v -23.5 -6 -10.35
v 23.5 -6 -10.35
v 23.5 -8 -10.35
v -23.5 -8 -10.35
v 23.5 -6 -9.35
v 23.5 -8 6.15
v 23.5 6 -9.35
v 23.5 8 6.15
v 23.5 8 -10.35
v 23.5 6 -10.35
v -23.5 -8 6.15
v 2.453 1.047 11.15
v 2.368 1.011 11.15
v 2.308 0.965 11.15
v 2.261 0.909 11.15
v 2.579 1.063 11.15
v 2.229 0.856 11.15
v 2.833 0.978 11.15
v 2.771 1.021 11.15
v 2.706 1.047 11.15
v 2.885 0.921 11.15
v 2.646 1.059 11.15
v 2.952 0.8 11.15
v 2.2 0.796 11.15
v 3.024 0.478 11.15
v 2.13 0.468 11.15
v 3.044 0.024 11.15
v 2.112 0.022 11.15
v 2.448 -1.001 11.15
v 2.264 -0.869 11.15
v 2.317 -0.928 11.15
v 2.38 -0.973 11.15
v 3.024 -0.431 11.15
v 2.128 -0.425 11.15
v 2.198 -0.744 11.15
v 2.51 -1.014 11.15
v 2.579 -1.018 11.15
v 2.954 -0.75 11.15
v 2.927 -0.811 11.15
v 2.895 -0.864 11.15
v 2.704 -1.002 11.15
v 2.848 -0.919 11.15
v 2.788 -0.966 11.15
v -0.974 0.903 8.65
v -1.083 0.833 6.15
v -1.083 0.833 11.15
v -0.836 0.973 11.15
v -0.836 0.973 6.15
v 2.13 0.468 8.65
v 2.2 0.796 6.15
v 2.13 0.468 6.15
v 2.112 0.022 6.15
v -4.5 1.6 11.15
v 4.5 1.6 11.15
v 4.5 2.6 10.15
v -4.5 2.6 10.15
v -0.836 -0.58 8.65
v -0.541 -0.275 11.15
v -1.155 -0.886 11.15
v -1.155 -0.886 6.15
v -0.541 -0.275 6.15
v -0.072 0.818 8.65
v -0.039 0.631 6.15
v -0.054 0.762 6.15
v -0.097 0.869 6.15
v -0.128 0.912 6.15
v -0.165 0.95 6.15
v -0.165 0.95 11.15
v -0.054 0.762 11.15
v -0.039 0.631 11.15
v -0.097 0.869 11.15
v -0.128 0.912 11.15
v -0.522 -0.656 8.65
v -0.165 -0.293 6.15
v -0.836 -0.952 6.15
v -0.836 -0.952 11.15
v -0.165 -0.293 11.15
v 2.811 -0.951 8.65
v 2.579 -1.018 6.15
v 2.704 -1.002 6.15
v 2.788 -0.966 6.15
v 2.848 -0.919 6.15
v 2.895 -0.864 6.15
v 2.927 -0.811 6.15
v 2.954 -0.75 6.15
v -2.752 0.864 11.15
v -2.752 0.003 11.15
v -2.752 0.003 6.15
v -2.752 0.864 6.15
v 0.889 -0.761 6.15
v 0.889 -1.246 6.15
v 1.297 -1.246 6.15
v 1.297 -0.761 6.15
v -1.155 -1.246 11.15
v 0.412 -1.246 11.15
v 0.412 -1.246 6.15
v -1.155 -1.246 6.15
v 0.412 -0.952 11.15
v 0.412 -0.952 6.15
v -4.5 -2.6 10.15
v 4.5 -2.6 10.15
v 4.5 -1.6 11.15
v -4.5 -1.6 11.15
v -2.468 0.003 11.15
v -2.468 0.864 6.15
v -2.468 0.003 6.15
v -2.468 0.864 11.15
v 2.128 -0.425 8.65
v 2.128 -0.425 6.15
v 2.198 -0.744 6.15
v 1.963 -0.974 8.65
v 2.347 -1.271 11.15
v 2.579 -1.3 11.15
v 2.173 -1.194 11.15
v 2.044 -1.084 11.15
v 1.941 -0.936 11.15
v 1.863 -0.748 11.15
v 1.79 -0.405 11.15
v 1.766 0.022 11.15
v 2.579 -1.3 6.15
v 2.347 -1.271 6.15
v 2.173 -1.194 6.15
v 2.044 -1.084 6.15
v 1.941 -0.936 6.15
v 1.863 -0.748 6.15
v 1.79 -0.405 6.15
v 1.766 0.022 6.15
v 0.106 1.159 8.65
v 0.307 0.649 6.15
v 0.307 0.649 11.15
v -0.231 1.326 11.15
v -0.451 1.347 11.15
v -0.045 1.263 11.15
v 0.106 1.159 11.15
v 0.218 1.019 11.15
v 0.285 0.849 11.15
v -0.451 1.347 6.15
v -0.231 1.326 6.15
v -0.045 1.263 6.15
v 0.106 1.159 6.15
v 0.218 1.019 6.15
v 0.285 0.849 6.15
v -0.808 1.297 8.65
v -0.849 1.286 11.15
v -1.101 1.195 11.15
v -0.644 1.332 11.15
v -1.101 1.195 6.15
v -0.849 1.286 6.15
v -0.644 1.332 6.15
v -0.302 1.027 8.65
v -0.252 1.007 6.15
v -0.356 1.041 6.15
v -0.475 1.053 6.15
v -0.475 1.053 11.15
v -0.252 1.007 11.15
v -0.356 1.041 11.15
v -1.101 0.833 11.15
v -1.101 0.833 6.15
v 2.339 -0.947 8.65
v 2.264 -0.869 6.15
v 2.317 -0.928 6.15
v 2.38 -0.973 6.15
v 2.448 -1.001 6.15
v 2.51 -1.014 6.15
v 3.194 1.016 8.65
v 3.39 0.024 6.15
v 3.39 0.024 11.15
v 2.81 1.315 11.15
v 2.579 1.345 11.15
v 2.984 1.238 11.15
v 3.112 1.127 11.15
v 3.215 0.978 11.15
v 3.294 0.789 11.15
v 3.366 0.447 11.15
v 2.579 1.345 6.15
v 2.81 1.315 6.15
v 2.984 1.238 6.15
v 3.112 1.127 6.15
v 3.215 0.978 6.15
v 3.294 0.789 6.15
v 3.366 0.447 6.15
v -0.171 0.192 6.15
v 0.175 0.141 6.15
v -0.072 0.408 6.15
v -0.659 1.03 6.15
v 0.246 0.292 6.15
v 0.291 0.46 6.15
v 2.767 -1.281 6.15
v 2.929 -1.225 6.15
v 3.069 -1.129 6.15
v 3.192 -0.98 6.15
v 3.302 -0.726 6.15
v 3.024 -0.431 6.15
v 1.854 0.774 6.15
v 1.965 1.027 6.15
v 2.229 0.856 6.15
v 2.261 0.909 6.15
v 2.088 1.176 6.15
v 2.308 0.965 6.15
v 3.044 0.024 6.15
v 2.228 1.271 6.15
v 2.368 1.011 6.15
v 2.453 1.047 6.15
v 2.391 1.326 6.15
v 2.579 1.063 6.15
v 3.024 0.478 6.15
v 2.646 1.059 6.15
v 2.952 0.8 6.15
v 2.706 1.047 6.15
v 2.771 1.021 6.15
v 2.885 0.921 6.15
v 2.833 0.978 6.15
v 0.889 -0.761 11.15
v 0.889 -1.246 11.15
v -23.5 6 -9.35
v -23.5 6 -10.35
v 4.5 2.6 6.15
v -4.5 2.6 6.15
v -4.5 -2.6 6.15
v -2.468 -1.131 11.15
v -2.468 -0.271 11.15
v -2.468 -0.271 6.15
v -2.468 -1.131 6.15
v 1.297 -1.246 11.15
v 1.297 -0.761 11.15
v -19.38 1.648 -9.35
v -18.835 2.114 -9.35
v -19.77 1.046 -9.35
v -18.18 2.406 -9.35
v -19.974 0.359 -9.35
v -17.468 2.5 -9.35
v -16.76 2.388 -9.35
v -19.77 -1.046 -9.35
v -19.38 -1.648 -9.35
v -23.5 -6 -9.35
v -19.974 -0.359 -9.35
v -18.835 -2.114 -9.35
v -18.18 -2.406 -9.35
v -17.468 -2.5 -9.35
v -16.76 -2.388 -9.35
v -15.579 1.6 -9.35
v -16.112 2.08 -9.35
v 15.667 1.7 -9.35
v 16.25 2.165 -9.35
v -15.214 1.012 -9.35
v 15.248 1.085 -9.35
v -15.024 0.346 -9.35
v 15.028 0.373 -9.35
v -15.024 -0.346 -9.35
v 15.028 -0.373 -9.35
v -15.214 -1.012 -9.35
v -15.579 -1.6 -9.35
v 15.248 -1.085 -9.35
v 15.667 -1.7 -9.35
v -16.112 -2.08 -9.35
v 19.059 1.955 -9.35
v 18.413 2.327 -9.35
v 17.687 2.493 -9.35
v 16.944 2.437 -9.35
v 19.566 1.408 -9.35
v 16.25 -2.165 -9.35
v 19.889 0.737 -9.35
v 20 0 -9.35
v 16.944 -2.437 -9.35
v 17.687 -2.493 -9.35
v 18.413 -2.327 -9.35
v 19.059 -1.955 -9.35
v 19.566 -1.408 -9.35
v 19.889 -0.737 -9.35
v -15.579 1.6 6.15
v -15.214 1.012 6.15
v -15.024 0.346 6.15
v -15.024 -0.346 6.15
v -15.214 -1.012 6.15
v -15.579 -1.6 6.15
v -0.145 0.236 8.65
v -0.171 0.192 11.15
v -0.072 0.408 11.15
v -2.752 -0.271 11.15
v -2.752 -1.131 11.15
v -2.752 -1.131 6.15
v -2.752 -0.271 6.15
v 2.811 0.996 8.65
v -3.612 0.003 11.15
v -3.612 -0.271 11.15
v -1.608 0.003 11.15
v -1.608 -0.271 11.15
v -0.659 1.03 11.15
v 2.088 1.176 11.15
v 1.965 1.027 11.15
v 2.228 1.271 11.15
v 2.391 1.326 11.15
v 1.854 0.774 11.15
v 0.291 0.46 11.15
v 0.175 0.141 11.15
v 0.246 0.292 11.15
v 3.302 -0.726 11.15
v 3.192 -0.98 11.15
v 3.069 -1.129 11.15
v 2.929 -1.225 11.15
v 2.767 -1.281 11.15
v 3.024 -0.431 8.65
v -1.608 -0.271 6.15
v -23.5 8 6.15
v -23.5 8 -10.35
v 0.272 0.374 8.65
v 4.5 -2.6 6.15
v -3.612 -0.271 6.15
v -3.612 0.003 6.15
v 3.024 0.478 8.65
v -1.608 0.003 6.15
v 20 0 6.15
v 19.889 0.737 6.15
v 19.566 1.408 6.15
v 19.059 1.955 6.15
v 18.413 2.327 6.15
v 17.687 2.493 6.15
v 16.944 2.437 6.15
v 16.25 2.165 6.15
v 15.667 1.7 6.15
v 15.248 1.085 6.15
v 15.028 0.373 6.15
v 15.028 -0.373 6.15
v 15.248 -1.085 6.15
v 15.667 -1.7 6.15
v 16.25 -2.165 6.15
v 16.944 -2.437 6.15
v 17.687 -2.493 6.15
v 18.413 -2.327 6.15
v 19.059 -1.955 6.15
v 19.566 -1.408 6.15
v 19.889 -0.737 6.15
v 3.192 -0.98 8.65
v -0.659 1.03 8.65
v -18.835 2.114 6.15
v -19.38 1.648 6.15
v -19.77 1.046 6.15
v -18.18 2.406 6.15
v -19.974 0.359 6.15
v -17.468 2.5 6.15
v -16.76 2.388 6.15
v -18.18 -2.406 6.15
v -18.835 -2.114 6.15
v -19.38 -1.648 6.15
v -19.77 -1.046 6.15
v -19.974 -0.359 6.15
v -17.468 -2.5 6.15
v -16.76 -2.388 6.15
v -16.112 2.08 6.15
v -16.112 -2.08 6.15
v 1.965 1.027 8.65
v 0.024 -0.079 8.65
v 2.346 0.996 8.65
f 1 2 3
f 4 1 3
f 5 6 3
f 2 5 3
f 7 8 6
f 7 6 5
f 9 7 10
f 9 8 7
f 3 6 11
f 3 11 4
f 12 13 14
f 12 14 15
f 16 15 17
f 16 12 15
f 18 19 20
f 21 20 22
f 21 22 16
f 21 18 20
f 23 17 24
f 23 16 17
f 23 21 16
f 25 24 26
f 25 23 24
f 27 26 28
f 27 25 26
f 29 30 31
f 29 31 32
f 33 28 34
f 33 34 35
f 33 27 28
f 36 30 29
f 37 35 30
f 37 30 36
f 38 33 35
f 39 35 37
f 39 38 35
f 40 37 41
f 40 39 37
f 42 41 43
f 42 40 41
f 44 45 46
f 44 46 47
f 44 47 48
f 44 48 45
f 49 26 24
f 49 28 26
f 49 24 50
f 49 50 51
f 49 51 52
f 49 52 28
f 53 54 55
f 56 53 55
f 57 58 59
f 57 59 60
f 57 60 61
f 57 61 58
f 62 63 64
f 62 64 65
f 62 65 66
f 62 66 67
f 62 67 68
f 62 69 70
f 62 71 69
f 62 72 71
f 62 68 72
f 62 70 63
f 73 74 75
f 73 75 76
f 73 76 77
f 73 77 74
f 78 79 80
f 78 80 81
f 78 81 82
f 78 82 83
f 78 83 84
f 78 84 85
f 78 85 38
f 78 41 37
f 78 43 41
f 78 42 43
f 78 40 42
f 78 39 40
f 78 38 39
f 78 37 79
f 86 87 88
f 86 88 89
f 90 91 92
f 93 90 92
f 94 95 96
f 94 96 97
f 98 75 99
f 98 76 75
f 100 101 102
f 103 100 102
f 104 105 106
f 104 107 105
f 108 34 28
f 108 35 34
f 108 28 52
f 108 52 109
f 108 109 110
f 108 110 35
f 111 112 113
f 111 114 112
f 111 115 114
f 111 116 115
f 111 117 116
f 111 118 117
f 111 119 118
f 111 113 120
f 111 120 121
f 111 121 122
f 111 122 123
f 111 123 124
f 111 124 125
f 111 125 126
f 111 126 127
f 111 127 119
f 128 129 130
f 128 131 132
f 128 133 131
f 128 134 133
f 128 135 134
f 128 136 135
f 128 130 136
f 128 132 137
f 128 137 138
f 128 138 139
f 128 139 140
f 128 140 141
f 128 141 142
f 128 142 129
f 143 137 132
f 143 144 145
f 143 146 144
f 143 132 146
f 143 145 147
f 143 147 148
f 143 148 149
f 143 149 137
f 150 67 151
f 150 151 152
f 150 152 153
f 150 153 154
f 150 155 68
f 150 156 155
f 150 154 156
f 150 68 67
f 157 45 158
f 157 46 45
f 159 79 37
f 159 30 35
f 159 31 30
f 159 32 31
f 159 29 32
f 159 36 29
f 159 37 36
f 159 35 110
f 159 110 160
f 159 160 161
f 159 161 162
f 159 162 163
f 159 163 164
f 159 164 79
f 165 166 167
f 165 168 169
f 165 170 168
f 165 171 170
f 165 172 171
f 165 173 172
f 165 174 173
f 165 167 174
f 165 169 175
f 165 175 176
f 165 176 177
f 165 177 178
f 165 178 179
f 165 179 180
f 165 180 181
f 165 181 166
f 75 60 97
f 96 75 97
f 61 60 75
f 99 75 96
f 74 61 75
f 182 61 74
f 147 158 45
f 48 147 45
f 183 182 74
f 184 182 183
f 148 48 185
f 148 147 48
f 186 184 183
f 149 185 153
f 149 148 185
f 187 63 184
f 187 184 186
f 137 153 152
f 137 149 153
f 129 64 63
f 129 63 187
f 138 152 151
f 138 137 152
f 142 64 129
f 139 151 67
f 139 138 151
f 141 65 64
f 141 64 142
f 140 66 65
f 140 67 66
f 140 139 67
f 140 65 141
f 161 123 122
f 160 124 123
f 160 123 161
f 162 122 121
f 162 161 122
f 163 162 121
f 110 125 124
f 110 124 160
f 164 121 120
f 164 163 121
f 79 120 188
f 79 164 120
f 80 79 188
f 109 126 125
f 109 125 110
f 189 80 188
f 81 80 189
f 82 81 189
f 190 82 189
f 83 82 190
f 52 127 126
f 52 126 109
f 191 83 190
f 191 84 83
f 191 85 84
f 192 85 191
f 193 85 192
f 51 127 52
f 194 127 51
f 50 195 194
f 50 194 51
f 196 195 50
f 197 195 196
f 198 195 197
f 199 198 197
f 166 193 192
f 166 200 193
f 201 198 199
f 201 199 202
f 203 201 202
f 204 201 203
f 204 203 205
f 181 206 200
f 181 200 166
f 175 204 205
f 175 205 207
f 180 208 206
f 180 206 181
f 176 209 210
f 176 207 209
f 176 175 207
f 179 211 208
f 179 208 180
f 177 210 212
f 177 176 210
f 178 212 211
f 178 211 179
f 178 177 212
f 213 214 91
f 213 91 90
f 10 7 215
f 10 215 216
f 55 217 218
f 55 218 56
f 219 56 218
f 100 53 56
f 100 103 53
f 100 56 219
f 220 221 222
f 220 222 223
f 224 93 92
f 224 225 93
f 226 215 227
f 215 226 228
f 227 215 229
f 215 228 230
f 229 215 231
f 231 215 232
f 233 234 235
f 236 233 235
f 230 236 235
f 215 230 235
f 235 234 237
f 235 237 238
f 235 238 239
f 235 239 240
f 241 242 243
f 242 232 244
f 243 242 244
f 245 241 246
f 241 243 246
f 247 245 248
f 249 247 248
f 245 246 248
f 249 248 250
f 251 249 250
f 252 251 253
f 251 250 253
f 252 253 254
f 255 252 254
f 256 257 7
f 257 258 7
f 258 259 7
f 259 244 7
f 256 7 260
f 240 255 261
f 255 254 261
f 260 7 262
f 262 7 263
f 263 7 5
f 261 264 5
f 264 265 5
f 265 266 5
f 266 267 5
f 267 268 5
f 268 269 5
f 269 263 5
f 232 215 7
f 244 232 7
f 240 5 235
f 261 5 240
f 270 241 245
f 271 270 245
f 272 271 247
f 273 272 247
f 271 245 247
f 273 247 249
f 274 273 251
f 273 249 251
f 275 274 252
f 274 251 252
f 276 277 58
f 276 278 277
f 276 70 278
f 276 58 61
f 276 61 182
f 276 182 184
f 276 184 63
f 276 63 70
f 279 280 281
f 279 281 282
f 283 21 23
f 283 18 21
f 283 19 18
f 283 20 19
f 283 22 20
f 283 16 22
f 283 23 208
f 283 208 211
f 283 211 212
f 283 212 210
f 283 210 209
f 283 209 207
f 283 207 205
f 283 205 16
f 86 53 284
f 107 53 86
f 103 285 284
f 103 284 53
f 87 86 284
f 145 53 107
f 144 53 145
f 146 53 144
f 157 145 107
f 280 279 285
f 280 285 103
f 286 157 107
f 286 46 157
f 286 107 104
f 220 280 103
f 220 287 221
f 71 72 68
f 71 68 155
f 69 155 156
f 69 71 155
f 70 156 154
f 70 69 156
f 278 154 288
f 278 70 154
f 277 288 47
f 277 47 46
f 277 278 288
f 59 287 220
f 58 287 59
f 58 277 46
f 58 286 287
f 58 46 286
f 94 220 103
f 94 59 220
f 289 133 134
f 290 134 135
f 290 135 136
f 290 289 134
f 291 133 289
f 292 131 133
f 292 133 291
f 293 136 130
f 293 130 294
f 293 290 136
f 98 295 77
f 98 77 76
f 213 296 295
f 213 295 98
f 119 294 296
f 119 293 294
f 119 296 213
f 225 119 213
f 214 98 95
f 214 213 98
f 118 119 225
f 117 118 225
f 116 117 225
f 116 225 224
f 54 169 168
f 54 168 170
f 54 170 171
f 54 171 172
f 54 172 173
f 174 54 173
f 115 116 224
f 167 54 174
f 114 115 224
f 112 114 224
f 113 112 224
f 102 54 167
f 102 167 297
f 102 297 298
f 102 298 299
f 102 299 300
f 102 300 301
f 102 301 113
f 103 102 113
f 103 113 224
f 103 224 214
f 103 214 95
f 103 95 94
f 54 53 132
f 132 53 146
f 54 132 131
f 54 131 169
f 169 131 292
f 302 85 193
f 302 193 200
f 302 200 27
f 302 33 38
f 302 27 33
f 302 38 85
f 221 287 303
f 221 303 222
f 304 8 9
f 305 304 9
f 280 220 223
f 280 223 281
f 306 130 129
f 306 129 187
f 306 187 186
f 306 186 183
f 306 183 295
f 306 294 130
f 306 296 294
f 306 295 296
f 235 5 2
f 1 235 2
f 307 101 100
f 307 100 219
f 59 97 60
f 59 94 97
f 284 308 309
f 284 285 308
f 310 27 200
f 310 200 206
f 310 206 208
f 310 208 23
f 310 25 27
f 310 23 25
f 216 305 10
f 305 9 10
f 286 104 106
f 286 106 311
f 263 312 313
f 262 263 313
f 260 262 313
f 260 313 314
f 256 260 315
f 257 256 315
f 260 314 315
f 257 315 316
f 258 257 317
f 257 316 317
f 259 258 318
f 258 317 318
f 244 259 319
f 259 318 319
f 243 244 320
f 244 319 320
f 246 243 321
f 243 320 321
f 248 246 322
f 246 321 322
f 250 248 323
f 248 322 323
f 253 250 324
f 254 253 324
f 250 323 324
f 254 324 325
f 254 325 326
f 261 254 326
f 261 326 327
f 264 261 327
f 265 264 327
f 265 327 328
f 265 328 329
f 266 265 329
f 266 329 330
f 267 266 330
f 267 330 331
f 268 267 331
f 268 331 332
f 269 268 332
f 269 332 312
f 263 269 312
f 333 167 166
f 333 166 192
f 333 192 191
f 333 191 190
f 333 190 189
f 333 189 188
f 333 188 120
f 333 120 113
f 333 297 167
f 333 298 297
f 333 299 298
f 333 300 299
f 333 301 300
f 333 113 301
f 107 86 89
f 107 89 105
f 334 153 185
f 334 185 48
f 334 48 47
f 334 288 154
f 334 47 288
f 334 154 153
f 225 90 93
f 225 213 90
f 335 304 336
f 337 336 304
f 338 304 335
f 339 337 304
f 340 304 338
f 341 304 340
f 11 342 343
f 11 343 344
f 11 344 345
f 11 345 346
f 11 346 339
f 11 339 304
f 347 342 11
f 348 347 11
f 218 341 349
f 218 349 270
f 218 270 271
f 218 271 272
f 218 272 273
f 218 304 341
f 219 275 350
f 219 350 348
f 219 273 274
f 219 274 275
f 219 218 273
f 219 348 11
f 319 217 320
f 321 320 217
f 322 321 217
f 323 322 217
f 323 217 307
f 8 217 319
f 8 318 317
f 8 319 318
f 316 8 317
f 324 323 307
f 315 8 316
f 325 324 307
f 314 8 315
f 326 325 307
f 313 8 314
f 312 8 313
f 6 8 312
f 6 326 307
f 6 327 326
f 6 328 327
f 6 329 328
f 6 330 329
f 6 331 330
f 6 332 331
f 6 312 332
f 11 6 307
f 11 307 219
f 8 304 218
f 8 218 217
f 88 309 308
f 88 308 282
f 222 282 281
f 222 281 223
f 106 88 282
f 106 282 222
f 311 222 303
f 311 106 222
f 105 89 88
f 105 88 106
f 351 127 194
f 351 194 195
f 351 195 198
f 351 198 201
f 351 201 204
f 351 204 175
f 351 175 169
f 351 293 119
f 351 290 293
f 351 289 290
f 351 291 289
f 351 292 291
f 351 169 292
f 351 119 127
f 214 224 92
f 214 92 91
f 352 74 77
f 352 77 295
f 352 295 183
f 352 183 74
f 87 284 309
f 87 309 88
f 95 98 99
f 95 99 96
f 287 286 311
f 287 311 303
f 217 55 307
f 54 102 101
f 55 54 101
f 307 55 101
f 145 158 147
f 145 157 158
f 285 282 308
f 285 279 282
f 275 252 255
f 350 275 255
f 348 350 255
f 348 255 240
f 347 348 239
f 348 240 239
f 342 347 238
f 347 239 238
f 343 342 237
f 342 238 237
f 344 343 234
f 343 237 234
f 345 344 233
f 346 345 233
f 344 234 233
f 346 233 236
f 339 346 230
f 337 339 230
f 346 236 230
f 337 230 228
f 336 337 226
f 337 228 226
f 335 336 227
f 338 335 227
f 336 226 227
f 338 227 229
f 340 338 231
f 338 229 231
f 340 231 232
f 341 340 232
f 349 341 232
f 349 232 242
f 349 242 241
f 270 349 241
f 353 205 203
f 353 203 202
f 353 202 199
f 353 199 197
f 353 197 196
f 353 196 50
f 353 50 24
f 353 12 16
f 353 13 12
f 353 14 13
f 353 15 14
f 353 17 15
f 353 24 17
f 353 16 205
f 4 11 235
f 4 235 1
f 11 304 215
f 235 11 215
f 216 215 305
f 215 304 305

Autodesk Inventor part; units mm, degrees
ref_plane "YZ Plane" through (0, 0, 0) normal (1, 0, 0) x (0, 1, 0)
ref_plane "XZ Plane" through (0, 0, 0) normal (0, 1, 0) x (-1, 0, 0)
ref_plane "XY Plane" through (0, 0, 0) normal (0, 0, 1) x (1, 0, 0)
ref_plane "작업 평면1" through (23.5, -8, -2) normal (1, 0, 0) x (0, 0, -1)
sketch "스케치1" plane through (23.5, -8, -2) normal (1, 0, 0) x (0, 0, -1)
  line L0 (0, 16) -> (-8.15, 16) projected
  line L1 (-8.15, 16) -> (-8.15, 10.6) projected
  line L2 (-8.15, 10.6) -> (-12.15, 10.6) projected
  line L3 (-13.15, 9.6) -> (-12.15, 10.6) projected
  line L4 (-13.15, 9.6) -> (-13.15, 6.4) projected
  line L5 (-12.15, 5.4) -> (-13.15, 6.4) projected
  line L6 (-12.15, 5.4) -> (-8.15, 5.4) projected
  line L7 (-8.15, 5.4) -> (-8.15, 0) projected
  line L8 (-8.15, 0) -> (0, 0) projected
  line L9 (0, 16) -> (8.35, 16)
  line L10 (8.35, 16) -> (8.35, 15)
  line L11 (0, 0) -> (8.35, 0)
  line L12 (8.35, 0) -> (8.35, 1)
  line L13 (0, 16) -> (-8.15, 16)
  line L14 (-8.15, 10.6) -> (-12.15, 10.6) projected
  line L15 (-8.15, 10.6) -> (-12.15, 10.6)
  line L16 (-12.15, 10.6) -> (-13.15, 9.6)
  line L17 (-13.15, 6.4) -> (-12.15, 5.4)
  line L18 (7.35, 14) -> (8.35, 14)
  line L19 (8.35, 14) -> (8.35, 15)
  line L20 (7.35, 2) -> (8.35, 2)
  line L21 (8.35, 2) -> (8.35, 1)
  line L22 (7.35, 14) -> (7.35, 2)
  point P0 (-2, 8)
  point P1 (4.35, 10.6)
  point P2 (4.35, 5.4)
  dimension "d1" = 8.35
  dimension "d13" = 8.35
sketch "스케치2" plane through (-23.5, 8, 6.15) normal (0, 0, 1) x (1, 0, 0)
  arc A0 (7.9209, -9.6) -> (7.9209, -6.4) centre (6, -8) ccw projected
  line L0 (39.0791, -9.6) -> (7.9209, -9.6) projected
  circle A1 centre (6, -8) radius 2.5
  circle A2 centre (41, -8) radius 2.5 projected
  circle A3 centre (41, -8) radius 2.5
  point P0 (23.5, -8)
  point P1 (7.9209, -6.4)
extrude "돌출1" add sketch "스케치1" against normal up to surface (47 mm away)
extrude "돌출2" cut sketch "스케치2" along normal mid plane 50
sketch "스케치3" plane through (-15.5791, 1.6, 11.15) normal (0, 0, 1) x (1, 0, 0)
  line L0 (15.5791, -14.4593) -> (15.5791, 15.5737)
  line L1 (-7.9209, 4.4) -> (-7.9209, -7.6) projected
  line L2 (-7.9209, 4.4) -> (11.0791, 4.4)
  line L3 (11.0791, 4.4) -> (11.0791, -7.6)
  line L4 (11.0791, -7.6) -> (-7.9209, -7.6)
  line L5 (-7.9209, -7.6) -> (-7.9209, 4.4)
  line L6 (39.0791, 4.4) -> (39.0791, -7.6)
  line L7 (39.0791, 4.4) -> (20.0791, 4.4)
  line L8 (20.0791, 4.4) -> (20.0791, -7.6)
  line L9 (20.0791, -7.6) -> (39.0791, -7.6)
  line L10 (39.0791, -7.6) -> (39.0791, 4.4)
  point P0 (15.5791, -1.6)
  dimension "d9" = 19
extrude "돌출3" cut sketch "스케치3" against normal up to surface (5 mm away)
sketch "스케치4" plane through (-4.5, 1.6, 11.15) normal (0, 0, 1) x (1, 0, 0)
  line L0 (0.6181, -0.2528) -> (7.2489, -0.2528) construction
  line L1 (7.2489, -0.2528) -> (7.2489, -2.6222) construction
  line L2 (7.2489, -2.6222) -> (0.6181, -2.6222) construction
  line L3 (0.6181, -2.6222) -> (0.6181, -0.2528) construction
  line L4 (2.8925, -1.8707) -> (2.0321, -1.8707)
  line L5 (2.0321, -1.8707) -> (2.0321, -2.7311)
  line L6 (2.0321, -2.7311) -> (1.7481, -2.7311)
  line L7 (1.7481, -2.7311) -> (1.7481, -1.8707)
  line L8 (1.7481, -1.8707) -> (0.8877, -1.8707)
  line L9 (0.8877, -1.8707) -> (0.8877, -1.5969)
  line L10 (0.8877, -1.5969) -> (1.7481, -1.5969)
  line L11 (1.7481, -1.5969) -> (1.7481, -0.7365)
  line L12 (1.7481, -0.7365) -> (2.0321, -0.7365)
  line L13 (2.0321, -0.7365) -> (2.0321, -1.5969)
  line L14 (2.0321, -1.5969) -> (2.8925, -1.5969)
  line L15 (2.8925, -1.5969) -> (2.8925, -1.8707)
  line L16 (4.9118, -2.8463) -> (3.3454, -2.8463)
  line L17 (3.3454, -2.8463) -> (3.3454, -2.4861)
  spline S0 degree 2 poles (3.3454, -2.4861) (3.5142, -2.3276) (3.8147, -2.0333) (3.9588, -1.8748) knots 0 0 0 1 2 2 2
  spline S1 degree 2 poles (3.9588, -1.8748) (4.249, -1.5558) (4.461, -1.1729) (4.461, -0.9691) knots 0 0 0 1 2 2 2
  spline S2 degree 2 poles (4.461, -0.9691) (4.461, -0.8621) (4.3951, -0.7015) (4.3354, -0.6501) knots 0 0 0 1 2 2 2
  spline S3 degree 2 poles (4.3354, -0.6501) (4.2757, -0.5986) (4.1193, -0.5472) (4.0246, -0.5472) knots 0 0 0 1 2 2 2
  spline S4 degree 2 poles (4.0246, -0.5472) (3.9341, -0.5472) (3.7488, -0.5925) (3.6644, -0.6274) knots 0 0 0 1 2 2 2
  spline S5 degree 2 poles (3.6644, -0.6274) (3.5924, -0.6563) (3.4586, -0.7386) (3.4174, -0.7674) knots 0 0 0 1 2 2 2
  line L18 (3.4174, -0.7674) -> (3.3989, -0.7674)
  line L19 (3.3989, -0.7674) -> (3.3989, -0.4051)
  spline S6 degree 2 poles (3.3989, -0.4051) (3.5039, -0.3537) (3.8805, -0.2528) (4.0493, -0.2528) knots 0 0 0 1 2 2 2
  spline S7 degree 2 poles (4.0493, -0.2528) (4.4054, -0.2528) (4.8068, -0.6295) (4.8068, -0.9506) knots 0 0 0 1 2 2 2
  spline S8 degree 2 poles (4.8068, -0.9506) (4.8068, -1.1009) (4.7368, -1.352) (4.6751, -1.459) knots 0 0 0 1 2 2 2
  spline S9 degree 2 poles (4.6751, -1.459) (4.6133, -1.5702) (4.4342, -1.7884) (4.3354, -1.8933) knots 0 0 0 1 2 2 2
  spline S10 degree 2 poles (4.3354, -1.8933) (4.1749, -2.0683) (3.7817, -2.4429) (3.6644, -2.552) knots 0 0 0 1 2 2 2
  line L20 (3.6644, -2.552) -> (4.9118, -2.552)
  line L21 (4.9118, -2.552) -> (4.9118, -2.8463)
  line L22 (5.7969, -2.8463) -> (5.3893, -2.8463)
  line L23 (5.3893, -2.8463) -> (5.3893, -2.3606)
  line L24 (5.3893, -2.3606) -> (5.7969, -2.3606)
  line L25 (5.7969, -2.3606) -> (5.7969, -2.8463)
  spline S11 degree 2 poles (7.8902, -1.5763) (7.8902, -2.2597) (7.4929, -2.8999) (7.0792, -2.8999) knots 0 0 0 1 2 2 2
  spline S12 degree 2 poles (7.0792, -2.8999) (6.6593, -2.8999) (6.2662, -2.2474) (6.2662, -1.5784) knots 0 0 0 1 2 2 2
  spline S13 degree 2 poles (6.2662, -1.5784) (6.2662, -0.8909) (6.6634, -0.2549) (7.0792, -0.2549) knots 0 0 0 1 2 2 2
  spline S14 degree 2 poles (7.0792, -0.2549) (7.4971, -0.2549) (7.8902, -0.9136) (7.8902, -1.5763) knots 0 0 0 1 2 2 2
  spline S15 degree 2 poles (7.4538, -2.3503) (7.5032, -2.2247) (7.5444, -1.8378) (7.5444, -1.5763) knots 0 0 0 1 2 2 2
  spline S16 degree 2 poles (7.5444, -1.5763) (7.5444, -1.3149) (7.5032, -0.93) (7.4518, -0.8003) knots 0 0 0 1 2 2 2
  spline S17 degree 2 poles (7.4518, -0.8003) (7.4003, -0.6707) (7.2212, -0.5369) (7.0792, -0.5369) knots 0 0 0 1 2 2 2
  spline S18 degree 2 poles (7.0792, -0.5369) (6.9372, -0.5369) (6.754, -0.6707) (6.7005, -0.8045) knots 0 0 0 1 2 2 2
  spline S19 degree 2 poles (6.7005, -0.8045) (6.649, -0.9341) (6.612, -1.3293) (6.612, -1.5784) knots 0 0 0 1 2 2 2
  spline S20 degree 2 poles (6.612, -1.5784) (6.612, -1.846) (6.6449, -2.2041) (6.6984, -2.3441) knots 0 0 0 1 2 2 2
  spline S21 degree 2 poles (6.6984, -2.3441) (6.7478, -2.4758) (6.931, -2.6179) (7.0792, -2.6179) knots 0 0 0 1 2 2 2
  spline S22 degree 2 poles (7.0792, -2.6179) (7.2192, -2.6179) (7.4024, -2.4841) (7.4538, -2.3503) knots 0 0 0 1 2 2 2
  point P0 (4.5, -1.6)
extrude "돌출4" cut sketch "스케치4" against normal blind 5
properties part number "Bearing Spacer_V2_2mm"
